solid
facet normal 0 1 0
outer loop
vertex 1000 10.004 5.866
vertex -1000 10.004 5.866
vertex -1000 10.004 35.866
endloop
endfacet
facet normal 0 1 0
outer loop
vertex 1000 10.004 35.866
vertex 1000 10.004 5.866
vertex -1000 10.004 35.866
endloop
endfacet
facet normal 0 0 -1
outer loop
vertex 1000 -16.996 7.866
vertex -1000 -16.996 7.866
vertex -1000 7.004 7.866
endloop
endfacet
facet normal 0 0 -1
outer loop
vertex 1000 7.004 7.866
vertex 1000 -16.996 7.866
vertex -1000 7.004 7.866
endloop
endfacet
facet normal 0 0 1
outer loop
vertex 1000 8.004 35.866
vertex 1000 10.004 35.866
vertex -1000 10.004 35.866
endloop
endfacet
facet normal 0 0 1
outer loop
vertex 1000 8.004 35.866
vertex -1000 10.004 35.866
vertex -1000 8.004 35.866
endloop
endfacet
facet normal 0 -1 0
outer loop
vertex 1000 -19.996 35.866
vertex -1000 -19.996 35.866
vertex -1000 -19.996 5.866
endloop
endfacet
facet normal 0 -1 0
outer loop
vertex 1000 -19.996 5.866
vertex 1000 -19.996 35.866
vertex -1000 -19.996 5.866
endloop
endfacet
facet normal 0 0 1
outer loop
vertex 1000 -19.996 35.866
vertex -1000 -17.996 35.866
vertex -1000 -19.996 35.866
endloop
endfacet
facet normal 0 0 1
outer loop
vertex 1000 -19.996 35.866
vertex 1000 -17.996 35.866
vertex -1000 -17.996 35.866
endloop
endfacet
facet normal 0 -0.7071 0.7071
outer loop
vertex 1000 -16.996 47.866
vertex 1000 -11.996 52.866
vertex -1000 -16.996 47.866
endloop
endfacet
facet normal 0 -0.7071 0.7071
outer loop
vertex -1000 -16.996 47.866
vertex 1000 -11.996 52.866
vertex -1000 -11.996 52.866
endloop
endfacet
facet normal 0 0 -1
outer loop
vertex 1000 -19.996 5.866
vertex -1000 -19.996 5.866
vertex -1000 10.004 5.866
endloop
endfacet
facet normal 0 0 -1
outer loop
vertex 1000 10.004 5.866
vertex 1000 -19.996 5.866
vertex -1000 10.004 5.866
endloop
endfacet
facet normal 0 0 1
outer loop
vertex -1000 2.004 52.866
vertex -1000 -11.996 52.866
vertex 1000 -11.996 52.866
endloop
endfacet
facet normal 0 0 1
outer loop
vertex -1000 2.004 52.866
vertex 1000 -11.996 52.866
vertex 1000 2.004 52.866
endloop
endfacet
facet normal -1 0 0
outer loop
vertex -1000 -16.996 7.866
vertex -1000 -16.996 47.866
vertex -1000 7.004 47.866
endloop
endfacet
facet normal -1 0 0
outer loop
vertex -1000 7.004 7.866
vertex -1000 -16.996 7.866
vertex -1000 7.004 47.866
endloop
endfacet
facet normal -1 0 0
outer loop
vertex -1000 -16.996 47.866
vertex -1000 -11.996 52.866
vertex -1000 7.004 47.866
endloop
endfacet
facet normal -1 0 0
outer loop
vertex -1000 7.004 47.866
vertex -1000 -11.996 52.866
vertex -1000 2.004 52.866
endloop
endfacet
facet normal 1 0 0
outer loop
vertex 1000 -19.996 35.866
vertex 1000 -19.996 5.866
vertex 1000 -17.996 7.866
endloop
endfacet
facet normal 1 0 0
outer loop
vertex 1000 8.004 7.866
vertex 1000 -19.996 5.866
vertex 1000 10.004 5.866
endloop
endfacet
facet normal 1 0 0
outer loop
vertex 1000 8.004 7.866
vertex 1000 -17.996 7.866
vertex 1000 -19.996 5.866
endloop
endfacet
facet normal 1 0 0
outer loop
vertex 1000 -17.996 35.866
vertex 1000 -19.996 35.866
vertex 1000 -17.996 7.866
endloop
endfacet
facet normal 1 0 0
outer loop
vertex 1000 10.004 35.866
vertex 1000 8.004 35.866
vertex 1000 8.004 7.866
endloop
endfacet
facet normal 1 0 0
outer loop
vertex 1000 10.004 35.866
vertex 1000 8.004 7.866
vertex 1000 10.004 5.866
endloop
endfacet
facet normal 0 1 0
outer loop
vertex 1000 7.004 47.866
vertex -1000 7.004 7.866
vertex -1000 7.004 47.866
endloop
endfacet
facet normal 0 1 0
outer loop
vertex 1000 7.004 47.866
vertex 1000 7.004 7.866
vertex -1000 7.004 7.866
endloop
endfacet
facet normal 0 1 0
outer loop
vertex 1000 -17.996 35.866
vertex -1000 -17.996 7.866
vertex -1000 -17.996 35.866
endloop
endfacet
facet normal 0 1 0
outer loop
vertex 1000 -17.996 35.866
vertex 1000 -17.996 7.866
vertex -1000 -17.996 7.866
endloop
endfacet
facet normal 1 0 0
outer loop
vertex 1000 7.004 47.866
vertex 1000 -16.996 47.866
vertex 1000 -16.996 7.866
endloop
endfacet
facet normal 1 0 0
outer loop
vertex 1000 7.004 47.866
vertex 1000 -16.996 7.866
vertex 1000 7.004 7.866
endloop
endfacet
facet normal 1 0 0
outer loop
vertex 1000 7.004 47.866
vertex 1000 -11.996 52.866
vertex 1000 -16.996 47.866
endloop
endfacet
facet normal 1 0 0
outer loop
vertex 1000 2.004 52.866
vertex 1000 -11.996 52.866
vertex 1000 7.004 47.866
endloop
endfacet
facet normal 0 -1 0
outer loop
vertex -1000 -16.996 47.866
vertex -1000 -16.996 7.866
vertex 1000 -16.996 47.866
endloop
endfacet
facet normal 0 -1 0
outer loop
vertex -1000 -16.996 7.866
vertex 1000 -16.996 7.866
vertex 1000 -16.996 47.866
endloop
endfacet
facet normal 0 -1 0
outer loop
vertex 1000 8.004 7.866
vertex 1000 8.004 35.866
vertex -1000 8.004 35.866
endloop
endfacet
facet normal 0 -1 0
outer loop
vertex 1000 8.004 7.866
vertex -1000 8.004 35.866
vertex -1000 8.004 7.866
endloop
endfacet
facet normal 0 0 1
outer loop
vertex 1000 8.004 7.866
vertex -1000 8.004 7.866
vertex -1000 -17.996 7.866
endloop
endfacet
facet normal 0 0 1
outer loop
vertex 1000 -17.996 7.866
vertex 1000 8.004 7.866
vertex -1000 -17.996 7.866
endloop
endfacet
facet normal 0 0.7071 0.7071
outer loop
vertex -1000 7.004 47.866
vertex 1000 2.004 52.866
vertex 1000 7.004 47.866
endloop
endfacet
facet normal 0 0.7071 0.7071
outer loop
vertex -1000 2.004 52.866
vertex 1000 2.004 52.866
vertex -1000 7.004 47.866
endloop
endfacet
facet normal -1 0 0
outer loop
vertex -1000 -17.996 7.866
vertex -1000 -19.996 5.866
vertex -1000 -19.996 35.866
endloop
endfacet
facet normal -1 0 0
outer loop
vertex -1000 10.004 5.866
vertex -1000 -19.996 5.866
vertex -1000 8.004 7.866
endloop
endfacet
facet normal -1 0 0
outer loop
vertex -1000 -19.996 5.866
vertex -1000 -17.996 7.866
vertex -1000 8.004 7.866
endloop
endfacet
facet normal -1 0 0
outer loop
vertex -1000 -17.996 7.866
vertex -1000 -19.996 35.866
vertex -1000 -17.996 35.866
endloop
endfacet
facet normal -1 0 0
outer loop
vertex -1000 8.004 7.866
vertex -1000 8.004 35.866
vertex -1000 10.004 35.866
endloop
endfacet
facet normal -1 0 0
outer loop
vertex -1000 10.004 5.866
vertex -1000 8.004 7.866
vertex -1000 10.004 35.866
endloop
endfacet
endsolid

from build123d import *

# Parameters (mm, degrees)
F0_W     = 24
F0_H     = 45
F1_DEPTH = 1000
F2_DEPTH = 1000
F3_SIZE  = 5


with BuildPart() as f1:
    # F0 (on Right) → F1 (new body, symmetric)
    with BuildSketch(Plane.YZ):
        with Locations((-4.996106, 30.366278)):
            Rectangle(F0_W, F0_H)
    extrude(amount=F1_DEPTH, both=True)

    # F3
    f3_edges = [f1.edges().sort_by_distance(p)[0] for p in [
        (0, -16.996106, 52.866278),
        (0, 7.003894, 52.866278),
    ]]
    chamfer(f3_edges, length=F3_SIZE)


with BuildPart() as f2:
    # F0 (on Right) → F2 (new body, symmetric)
    with BuildSketch(Plane.YZ):
        Polygon((-19.996106, 35.866278), (-19.996106, 5.866278), (10.003894, 5.866278), (10.003894, 35.866278), (8.003894, 35.866278), (8.003894, 7.866278), (7.003894, 7.866278), (-16.996106, 7.866278), (-17.996106, 7.866278), (-17.996106, 35.866278), align=None)
    extrude(amount=F2_DEPTH, both=True)


solid = Compound([f1.part, f2.part])
